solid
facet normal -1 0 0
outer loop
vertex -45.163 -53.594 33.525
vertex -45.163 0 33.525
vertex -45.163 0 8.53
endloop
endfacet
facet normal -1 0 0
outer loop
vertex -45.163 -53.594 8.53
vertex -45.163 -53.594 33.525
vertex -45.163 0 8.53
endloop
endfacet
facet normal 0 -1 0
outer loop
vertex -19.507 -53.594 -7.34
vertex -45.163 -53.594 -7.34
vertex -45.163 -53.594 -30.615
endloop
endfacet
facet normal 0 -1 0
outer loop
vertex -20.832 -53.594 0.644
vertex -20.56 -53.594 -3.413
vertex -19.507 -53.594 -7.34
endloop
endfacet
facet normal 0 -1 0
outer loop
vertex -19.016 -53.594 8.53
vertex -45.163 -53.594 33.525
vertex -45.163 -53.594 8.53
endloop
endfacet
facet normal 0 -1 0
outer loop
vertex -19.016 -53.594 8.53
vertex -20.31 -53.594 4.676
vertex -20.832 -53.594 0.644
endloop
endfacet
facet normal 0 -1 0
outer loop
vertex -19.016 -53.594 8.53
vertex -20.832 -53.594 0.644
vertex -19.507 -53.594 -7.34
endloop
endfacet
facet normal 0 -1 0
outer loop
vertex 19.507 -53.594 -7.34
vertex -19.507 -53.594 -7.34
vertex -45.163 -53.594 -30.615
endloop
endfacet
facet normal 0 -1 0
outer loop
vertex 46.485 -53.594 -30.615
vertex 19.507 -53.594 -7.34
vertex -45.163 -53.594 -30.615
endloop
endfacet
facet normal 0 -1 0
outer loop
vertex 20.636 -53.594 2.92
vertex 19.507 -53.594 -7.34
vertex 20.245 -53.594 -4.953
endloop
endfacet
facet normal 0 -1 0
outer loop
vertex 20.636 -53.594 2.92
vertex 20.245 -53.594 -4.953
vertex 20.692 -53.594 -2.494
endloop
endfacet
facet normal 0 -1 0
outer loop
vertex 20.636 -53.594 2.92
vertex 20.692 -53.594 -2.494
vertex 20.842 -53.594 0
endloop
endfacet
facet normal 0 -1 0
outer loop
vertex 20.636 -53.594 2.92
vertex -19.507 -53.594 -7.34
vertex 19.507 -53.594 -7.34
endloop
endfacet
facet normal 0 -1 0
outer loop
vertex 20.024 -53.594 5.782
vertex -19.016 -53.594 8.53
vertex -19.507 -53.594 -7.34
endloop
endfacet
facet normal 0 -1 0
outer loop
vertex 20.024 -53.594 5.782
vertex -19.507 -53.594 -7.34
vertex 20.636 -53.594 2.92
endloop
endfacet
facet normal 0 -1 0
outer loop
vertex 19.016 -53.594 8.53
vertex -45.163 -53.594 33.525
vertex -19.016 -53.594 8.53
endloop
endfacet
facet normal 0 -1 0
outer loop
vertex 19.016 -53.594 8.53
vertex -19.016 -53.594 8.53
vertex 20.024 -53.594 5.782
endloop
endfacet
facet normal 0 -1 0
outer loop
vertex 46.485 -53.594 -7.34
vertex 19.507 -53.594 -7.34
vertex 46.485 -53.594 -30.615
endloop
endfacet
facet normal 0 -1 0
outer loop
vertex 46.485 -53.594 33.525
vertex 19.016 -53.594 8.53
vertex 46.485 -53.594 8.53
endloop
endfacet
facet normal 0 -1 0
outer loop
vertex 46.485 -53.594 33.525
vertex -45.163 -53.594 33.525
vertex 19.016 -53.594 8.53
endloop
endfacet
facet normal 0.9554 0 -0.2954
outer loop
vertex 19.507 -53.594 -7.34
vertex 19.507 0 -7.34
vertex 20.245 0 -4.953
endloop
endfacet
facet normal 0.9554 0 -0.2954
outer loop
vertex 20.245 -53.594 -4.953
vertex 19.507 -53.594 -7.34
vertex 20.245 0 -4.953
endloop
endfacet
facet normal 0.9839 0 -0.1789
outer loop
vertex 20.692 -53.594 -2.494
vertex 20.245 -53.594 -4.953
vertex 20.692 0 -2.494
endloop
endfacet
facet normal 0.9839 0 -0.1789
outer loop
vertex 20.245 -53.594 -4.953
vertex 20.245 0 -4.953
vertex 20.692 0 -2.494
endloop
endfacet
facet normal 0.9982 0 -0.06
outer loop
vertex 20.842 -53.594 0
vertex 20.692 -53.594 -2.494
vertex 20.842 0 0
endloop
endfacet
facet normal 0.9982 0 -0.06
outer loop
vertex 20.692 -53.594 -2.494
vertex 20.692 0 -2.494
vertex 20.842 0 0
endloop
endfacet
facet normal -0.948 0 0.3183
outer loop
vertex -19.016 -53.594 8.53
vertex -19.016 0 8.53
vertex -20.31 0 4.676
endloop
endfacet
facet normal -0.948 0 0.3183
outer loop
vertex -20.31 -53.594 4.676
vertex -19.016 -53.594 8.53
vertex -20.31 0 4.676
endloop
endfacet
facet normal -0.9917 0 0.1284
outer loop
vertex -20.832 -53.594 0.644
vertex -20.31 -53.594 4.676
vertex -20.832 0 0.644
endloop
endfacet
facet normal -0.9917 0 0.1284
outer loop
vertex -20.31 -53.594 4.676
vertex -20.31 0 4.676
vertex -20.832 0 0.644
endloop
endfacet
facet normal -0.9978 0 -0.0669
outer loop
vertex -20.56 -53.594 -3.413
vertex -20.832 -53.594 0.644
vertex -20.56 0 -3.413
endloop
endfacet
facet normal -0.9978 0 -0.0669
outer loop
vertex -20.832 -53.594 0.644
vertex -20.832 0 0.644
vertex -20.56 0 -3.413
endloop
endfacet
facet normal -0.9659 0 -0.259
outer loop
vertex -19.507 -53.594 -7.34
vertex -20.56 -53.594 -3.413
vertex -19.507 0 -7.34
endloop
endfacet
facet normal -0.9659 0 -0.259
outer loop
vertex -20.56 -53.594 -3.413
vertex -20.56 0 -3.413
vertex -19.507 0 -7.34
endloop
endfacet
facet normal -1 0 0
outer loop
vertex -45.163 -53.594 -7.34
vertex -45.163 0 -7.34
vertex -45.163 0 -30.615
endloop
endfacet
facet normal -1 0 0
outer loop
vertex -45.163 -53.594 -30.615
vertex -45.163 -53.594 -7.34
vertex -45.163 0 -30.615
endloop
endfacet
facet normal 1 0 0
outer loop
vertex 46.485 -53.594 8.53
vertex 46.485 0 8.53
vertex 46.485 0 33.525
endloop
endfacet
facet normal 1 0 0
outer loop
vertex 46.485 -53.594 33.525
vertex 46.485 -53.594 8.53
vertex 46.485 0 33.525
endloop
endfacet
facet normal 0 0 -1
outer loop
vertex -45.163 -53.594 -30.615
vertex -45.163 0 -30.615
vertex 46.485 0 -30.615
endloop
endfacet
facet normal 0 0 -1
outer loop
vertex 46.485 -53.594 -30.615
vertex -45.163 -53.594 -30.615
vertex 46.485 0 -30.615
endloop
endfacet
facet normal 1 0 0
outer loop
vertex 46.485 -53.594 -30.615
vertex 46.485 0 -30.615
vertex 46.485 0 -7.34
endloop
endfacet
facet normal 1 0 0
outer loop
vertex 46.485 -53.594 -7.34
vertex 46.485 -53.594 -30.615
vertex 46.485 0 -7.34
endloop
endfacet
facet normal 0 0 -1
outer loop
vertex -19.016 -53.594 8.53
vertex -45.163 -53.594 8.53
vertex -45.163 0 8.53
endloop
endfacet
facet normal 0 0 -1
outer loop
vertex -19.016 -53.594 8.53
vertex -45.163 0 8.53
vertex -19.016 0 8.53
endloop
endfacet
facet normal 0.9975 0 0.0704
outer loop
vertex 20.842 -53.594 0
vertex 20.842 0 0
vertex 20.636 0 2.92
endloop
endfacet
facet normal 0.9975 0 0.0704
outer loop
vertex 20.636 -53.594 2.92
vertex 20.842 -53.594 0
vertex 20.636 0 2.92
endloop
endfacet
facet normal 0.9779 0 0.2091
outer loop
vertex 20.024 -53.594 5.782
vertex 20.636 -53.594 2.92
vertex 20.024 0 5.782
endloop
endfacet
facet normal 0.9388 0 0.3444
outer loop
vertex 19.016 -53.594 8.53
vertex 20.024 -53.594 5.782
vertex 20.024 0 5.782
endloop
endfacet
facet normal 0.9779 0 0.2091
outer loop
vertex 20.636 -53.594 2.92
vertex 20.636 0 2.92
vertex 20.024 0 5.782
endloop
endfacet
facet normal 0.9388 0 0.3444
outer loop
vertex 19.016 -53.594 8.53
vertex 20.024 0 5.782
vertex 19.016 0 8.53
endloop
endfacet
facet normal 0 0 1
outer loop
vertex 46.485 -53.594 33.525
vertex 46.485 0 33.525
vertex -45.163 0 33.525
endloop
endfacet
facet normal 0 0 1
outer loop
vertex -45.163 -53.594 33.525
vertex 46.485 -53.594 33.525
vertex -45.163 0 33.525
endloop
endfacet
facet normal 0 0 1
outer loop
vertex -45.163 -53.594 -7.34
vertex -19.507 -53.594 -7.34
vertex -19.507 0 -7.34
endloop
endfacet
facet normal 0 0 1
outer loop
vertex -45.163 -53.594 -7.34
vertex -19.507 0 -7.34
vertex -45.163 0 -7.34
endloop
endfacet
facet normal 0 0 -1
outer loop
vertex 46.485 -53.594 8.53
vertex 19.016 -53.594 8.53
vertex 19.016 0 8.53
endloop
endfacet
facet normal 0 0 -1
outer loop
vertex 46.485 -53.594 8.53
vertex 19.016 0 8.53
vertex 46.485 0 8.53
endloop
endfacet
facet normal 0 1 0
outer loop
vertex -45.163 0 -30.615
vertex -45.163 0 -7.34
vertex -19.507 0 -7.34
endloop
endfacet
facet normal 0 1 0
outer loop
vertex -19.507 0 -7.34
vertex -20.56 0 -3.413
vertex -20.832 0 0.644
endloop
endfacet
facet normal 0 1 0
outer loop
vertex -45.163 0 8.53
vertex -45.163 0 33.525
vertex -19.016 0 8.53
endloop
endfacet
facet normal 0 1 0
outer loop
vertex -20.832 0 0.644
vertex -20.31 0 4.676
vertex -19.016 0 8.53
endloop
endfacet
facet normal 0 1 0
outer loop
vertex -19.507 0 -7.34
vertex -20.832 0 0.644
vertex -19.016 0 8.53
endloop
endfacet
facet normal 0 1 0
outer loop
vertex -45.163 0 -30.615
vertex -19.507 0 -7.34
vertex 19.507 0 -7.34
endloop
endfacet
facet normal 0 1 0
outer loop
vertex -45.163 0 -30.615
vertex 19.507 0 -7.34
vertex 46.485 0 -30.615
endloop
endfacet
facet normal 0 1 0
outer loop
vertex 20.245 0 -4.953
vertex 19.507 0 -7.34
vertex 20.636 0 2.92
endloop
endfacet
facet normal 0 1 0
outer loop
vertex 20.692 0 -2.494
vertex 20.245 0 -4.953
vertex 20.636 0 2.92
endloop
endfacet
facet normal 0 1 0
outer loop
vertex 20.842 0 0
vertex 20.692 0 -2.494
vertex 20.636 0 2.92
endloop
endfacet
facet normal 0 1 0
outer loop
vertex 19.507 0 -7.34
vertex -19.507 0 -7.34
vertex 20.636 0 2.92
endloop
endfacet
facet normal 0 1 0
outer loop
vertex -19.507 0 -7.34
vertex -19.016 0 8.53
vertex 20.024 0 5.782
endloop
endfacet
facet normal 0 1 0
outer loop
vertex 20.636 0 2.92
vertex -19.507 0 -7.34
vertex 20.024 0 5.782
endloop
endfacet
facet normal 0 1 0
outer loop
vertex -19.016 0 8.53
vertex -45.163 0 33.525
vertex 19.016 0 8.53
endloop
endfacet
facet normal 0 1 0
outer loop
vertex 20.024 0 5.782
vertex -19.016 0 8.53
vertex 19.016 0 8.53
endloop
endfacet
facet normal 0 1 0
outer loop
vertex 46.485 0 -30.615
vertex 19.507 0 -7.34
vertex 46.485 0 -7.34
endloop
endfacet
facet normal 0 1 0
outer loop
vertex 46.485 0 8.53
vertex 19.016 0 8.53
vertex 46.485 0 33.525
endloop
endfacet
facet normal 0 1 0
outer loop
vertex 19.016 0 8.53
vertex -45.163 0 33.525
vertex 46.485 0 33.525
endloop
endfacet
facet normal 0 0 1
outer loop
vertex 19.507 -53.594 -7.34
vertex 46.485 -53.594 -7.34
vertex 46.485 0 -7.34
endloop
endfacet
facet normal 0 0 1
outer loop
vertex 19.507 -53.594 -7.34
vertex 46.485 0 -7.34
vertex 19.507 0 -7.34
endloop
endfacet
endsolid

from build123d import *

# Parameters (mm, degrees)
F1_DEPTH = 53.594


with BuildPart() as f1:
    # F0 (on Front) → F1 (new body)
    with BuildSketch(Plane.XZ):
        with BuildLine():
            Line((-19.50657, -7.33976), (-45.16267, -7.33976))
            Line((-45.16267, -7.33976), (-45.16267, -30.615397))
            Line((-45.16267, -30.615397), (46.485152, -30.615397))
            Line((46.485152, -30.615397), (46.485152, -7.33976))
            Line((46.485152, -7.33976), (19.50657, -7.33976))
            ThreePointArc((19.50657, -7.33976), (0, -20.841746), (-19.50657, -7.33976))
        make_face()
        with BuildLine():
            Line((46.485152, 33.524852), (-45.16267, 33.524852))
            Line((-45.16267, 33.524852), (-45.16267, 8.529992))
            Line((-45.16267, 8.529992), (-19.016246, 8.529992))
            ThreePointArc((-19.016246, 8.529992), (0, 20.841746), (19.016246, 8.529992))
            Line((19.016246, 8.529992), (46.485152, 8.529992))
            Line((46.485152, 8.529992), (46.485152, 33.524852))
        make_face()
        with BuildLine():
            ThreePointArc((19.016246, 8.529992), (0, 20.841746), (-19.016246, 8.529992))
            ThreePointArc((-19.016246, 8.529992), (-20.831805, 0.643636), (-19.50657, -7.33976))
            ThreePointArc((-19.50657, -7.33976), (0, -20.841746), (19.50657, -7.33976))
            ThreePointArc((19.50657, -7.33976), (20.505235, -3.730106), (20.841746, 0))
            ThreePointArc((20.841746, 0), (20.380261, 4.361571), (19.016246, 8.529992))
        make_face()
    extrude(amount=F1_DEPTH)


solid = f1.part
